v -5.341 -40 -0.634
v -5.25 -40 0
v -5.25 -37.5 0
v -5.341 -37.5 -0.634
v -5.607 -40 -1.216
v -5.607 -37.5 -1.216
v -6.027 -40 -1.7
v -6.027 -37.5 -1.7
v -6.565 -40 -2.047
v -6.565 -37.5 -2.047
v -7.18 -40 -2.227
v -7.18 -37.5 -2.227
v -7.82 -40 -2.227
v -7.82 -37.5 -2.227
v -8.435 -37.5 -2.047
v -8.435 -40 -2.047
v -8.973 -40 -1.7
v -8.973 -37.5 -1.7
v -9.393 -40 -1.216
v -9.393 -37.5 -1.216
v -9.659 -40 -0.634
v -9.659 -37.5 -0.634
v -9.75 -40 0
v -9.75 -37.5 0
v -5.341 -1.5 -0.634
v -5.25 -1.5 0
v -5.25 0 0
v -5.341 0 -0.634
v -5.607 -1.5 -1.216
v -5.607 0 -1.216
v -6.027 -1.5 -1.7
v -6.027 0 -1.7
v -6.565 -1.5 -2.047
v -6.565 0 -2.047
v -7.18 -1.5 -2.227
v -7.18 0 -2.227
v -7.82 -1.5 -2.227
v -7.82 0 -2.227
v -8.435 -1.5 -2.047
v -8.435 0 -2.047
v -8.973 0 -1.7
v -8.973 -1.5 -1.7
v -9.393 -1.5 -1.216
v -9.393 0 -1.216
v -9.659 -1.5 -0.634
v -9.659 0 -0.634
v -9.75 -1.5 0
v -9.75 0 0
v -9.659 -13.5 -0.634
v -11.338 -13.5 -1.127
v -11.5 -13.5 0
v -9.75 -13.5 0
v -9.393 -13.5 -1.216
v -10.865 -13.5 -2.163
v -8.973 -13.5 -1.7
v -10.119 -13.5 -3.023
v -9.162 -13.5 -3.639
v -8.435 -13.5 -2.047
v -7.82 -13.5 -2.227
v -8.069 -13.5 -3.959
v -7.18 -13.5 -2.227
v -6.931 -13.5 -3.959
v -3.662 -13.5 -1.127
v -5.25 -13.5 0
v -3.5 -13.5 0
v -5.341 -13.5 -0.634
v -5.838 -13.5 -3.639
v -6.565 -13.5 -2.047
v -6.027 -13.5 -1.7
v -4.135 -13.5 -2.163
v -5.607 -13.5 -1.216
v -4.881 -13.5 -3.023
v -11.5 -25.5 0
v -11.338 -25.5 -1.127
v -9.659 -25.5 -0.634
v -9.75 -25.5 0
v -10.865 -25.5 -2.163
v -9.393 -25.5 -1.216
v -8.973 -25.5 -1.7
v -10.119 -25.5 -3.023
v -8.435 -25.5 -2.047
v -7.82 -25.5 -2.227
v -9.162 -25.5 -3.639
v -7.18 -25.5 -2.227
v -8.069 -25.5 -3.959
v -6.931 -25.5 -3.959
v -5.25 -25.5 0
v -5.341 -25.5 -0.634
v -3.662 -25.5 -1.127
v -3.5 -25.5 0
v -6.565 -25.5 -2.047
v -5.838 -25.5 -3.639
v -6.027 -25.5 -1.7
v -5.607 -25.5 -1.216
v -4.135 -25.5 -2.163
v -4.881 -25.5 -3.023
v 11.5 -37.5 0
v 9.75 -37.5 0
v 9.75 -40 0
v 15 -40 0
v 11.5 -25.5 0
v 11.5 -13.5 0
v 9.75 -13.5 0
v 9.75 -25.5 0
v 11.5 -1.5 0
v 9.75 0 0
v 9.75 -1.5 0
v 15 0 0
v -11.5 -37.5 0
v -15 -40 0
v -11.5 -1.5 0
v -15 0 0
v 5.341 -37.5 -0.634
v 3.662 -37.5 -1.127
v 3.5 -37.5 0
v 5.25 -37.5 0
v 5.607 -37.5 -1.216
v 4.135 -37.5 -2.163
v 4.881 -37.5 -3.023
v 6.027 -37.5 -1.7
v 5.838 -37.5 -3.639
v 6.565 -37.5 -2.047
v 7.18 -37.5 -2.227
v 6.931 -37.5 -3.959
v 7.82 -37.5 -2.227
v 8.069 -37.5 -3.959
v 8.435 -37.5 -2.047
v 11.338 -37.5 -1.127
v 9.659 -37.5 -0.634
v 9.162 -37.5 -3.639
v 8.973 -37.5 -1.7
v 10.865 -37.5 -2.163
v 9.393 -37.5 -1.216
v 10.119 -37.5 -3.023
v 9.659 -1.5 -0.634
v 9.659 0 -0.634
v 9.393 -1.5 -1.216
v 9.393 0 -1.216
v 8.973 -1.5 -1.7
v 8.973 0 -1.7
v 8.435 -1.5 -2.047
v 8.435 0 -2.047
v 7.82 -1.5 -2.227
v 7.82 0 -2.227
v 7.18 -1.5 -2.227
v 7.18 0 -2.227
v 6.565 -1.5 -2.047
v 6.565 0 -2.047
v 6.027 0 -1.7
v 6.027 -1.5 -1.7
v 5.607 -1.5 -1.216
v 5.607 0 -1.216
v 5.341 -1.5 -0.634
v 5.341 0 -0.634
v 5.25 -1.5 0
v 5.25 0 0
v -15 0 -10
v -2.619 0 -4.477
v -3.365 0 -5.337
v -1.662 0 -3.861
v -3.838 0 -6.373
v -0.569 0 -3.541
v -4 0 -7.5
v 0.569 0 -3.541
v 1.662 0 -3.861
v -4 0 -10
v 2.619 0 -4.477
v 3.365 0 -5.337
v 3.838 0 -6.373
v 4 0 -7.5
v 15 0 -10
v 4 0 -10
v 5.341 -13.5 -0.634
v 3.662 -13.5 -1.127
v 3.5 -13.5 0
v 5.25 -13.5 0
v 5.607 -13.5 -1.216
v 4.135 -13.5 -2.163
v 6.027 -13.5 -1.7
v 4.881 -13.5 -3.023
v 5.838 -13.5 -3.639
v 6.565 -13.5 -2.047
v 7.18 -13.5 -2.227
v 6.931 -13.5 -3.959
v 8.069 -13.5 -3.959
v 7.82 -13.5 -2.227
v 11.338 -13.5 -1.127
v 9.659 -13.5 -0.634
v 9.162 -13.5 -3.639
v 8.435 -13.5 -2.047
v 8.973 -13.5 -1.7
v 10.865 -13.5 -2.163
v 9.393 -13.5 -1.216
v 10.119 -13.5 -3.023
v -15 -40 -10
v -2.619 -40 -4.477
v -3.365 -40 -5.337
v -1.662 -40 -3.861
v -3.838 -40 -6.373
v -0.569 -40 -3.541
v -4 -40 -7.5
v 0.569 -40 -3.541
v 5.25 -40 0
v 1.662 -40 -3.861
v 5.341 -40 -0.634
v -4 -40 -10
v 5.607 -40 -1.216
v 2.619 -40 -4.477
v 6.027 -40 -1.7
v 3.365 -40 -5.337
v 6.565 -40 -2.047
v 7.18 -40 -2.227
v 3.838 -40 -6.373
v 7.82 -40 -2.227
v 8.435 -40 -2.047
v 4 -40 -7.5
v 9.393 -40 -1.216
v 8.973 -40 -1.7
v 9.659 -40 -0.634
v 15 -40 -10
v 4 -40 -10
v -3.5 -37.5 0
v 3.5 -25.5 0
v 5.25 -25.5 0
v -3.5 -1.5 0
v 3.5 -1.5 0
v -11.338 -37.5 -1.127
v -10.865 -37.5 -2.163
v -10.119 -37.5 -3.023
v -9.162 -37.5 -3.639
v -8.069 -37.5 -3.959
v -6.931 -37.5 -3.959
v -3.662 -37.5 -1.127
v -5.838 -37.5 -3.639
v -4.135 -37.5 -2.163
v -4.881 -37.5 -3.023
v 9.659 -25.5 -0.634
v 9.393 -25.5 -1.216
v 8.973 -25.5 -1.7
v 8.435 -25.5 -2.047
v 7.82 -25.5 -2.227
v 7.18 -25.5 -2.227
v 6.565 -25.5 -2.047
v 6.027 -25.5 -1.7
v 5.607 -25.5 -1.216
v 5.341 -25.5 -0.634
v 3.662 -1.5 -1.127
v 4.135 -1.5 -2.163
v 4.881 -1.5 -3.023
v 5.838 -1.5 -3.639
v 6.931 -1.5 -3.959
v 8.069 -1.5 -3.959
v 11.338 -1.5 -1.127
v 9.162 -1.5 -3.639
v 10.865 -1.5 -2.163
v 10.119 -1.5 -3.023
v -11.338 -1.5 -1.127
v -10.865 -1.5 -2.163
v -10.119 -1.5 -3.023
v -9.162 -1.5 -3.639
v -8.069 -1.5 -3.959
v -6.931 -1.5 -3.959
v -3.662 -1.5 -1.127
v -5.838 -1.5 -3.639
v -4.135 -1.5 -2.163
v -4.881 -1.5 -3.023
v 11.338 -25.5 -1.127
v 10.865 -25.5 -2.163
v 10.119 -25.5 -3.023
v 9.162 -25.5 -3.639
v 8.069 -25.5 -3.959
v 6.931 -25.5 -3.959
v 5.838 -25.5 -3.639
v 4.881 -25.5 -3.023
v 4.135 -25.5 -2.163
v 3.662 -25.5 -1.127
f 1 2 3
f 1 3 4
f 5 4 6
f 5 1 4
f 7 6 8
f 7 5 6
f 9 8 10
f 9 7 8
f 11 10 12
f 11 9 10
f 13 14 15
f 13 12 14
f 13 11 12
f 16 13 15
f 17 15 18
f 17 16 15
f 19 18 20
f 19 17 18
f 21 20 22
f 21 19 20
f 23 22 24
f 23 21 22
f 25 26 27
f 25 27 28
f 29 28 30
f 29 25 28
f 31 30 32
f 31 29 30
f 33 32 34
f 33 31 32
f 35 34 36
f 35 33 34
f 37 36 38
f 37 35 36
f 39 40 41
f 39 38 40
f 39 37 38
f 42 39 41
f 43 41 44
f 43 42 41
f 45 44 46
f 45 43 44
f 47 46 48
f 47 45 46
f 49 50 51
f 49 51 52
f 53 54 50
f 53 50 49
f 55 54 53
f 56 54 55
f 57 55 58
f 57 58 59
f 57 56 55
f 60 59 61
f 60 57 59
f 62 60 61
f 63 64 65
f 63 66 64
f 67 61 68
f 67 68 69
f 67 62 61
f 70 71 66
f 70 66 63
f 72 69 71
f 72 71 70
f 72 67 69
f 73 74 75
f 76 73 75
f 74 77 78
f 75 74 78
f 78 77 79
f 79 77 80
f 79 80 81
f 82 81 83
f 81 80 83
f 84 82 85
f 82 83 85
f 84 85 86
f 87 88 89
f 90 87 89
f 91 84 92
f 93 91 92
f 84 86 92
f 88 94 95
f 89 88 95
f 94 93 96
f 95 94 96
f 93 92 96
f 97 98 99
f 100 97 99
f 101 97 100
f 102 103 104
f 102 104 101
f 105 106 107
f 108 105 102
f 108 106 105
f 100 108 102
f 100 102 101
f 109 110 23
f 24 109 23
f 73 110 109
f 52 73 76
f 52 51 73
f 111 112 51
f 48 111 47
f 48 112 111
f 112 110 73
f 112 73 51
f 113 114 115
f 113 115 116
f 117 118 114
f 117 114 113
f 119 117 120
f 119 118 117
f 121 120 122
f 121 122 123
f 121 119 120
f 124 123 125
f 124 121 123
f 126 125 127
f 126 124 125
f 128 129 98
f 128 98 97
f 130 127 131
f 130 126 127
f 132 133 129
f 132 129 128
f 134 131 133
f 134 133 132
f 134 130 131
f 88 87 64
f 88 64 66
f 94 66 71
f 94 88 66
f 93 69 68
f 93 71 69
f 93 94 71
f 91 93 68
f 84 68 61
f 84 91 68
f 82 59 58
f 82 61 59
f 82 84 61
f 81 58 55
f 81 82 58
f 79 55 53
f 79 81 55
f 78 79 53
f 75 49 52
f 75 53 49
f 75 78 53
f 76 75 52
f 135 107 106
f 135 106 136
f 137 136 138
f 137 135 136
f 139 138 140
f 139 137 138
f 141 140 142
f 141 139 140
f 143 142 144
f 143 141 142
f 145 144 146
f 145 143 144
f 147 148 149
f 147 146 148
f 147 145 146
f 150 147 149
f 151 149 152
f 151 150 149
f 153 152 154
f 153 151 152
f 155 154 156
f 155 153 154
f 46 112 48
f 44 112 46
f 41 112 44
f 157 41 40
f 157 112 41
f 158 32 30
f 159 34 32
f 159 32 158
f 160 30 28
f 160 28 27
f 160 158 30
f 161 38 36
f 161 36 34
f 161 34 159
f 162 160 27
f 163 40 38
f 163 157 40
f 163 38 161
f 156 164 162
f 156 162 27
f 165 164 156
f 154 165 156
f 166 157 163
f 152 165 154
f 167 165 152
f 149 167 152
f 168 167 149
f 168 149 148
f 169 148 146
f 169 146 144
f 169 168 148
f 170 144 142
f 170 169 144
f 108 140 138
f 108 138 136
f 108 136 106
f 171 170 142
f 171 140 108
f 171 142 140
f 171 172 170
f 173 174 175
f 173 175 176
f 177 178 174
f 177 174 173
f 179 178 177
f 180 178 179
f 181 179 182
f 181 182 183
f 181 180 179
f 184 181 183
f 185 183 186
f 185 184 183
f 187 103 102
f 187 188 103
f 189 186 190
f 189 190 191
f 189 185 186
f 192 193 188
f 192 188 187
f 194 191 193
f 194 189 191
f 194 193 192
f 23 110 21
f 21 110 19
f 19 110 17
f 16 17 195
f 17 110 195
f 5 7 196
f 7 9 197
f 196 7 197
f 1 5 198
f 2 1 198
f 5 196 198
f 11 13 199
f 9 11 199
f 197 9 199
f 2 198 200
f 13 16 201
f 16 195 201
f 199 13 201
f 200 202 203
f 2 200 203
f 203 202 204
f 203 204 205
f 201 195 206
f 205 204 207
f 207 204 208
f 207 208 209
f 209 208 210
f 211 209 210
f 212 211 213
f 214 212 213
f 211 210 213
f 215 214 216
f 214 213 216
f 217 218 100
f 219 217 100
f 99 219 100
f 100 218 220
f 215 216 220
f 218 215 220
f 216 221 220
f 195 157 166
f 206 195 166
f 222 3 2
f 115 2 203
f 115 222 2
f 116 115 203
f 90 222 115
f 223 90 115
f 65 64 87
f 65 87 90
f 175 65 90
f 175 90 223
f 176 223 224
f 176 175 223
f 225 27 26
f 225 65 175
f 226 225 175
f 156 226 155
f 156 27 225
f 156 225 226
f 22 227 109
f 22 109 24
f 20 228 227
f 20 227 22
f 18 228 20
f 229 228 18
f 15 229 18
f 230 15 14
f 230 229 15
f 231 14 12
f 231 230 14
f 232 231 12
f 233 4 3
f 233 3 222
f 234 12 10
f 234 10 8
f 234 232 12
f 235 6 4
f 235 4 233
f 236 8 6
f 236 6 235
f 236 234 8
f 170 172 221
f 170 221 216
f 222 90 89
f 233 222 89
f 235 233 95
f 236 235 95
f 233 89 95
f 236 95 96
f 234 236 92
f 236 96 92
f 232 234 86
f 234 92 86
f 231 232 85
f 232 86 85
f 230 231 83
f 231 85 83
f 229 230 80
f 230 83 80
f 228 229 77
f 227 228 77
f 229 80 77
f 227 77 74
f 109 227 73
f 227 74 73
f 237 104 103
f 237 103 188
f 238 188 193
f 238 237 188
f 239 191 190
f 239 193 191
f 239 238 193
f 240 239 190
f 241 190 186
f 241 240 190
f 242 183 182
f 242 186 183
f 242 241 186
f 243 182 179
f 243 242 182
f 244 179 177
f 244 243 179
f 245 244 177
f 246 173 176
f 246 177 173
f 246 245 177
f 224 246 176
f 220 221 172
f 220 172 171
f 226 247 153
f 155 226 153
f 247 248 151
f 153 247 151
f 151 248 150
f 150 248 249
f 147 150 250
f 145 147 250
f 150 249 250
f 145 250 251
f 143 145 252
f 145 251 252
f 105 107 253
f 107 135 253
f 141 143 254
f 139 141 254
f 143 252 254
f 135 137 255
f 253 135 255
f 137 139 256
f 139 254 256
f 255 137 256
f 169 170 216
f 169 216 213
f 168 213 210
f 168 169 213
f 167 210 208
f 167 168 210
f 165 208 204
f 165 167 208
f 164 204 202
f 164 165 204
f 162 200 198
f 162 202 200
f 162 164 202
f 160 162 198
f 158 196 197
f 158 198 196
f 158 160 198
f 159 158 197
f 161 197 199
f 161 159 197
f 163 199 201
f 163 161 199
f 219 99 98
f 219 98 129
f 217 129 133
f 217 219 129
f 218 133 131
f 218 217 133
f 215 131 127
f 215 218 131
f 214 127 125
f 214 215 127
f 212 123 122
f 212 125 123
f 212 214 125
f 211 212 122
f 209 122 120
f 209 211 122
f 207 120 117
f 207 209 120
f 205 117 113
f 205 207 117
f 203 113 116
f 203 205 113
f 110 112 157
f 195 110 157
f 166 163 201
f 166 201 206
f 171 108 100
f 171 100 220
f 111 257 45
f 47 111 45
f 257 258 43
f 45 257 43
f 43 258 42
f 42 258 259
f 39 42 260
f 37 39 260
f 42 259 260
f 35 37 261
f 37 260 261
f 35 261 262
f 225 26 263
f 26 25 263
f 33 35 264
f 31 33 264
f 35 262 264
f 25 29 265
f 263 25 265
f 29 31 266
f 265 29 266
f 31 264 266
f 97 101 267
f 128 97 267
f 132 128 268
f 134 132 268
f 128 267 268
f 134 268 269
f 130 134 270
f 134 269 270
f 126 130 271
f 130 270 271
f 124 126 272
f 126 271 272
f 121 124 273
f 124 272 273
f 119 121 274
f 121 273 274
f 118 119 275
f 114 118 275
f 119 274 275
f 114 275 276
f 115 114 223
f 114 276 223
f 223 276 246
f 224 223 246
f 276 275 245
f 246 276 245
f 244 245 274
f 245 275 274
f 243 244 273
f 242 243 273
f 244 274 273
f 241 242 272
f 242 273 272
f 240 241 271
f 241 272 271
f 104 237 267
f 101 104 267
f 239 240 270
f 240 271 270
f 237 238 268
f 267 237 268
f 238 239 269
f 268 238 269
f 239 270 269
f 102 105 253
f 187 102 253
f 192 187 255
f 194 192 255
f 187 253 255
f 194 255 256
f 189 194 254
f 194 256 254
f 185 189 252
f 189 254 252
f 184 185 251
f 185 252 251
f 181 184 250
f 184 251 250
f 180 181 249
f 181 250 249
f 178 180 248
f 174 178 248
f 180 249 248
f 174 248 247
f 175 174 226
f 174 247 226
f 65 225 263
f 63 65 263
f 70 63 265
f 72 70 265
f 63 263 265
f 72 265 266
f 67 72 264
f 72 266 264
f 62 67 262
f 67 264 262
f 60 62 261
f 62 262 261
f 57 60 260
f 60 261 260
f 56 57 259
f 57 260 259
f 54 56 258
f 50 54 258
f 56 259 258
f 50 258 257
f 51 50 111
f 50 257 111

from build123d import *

# Parameters (mm, degrees)
SKETCH_1_W               = 30
SKETCH_1_H               = 10
EXTRUDE_1_DEPTH          = 40
CUT_EXTRUDE_START        = -1.5
SKETCH_2_R               = 4
CUT_EXTRUDE_1_DEPTH      = 12
CUT_EXTRUDE_START_2      = -12
CUT_EXTRUDE_2_DEPTH      = 12
CUT_EXTRUDE_3_DEPTH      = 33.050741021
CUT_EXTRUDE_3_DEPTH_BACK = 33.050741021
SKETCH_4_R               = 2.25
CUT_EXTRUDE_4_DEPTH      = 44.874821937


with BuildPart() as part:
    # 草图1 → 凸台-拉伸1 (new body)
    with BuildSketch(Plane(origin=(0, 0, 0), x_dir=(1, 0, 0), z_dir=(0, 1, 0))):
        with Locations((0, 5)):
            Rectangle(SKETCH_1_W, SKETCH_1_H)
    extrude(amount=-EXTRUDE_1_DEPTH)

    # 草图2 → 切除-拉伸1 (cut)
    with BuildSketch(Plane(origin=(0, 0, 0), x_dir=(1, 0, 0), z_dir=(0, 1, 0)).offset(CUT_EXTRUDE_START)):
        with Locations((-7.5, 0)):
            Circle(SKETCH_2_R)
        with Locations((7.5, 0)):
            Circle(SKETCH_2_R)
    extrude(amount=-CUT_EXTRUDE_1_DEPTH, mode=Mode.SUBTRACT)

    # 草图3 → 切除-拉伸2 (cut)
    with BuildSketch(Plane(origin=(0, -13.5, 0), x_dir=(1, 0, 0), z_dir=(0, 1, 0)).offset(CUT_EXTRUDE_START_2)):
        with BuildLine():
            Line((-11.5, 0), (-3.5, 0))
            ThreePointArc((-3.5, 0), (-7.5, 4), (-11.5, 0))
        make_face()
        with BuildLine():
            Line((3.5, 0), (11.5, 0))
            ThreePointArc((11.5, 0), (7.5, 4), (3.5, 0))
        make_face()
    extrude(amount=-CUT_EXTRUDE_2_DEPTH, mode=Mode.SUBTRACT)

    # 草图4 → 切除-拉伸3 (cut, two sides: drawn at the far end of the back side and taken through both)
    with BuildSketch(Plane(origin=(0, -13.5, 0), x_dir=(1, 0, 0), z_dir=(0, 1, 0)).offset(-CUT_EXTRUDE_3_DEPTH_BACK)):
        with Locations((-7.5, 0)):
            Circle(SKETCH_4_R)
        with Locations((7.5, 0)):
            Circle(SKETCH_4_R)
    extrude(amount=CUT_EXTRUDE_3_DEPTH + CUT_EXTRUDE_3_DEPTH_BACK, mode=Mode.SUBTRACT)

    # 草图5 → 切除-拉伸4 (cut, through all)
    with BuildSketch(Plane(origin=(0, 0, 0), x_dir=(1, 0, 0), z_dir=(0, 1, 0))):
        with BuildLine():
            Line((-4, 7.5), (-4, 10))
            ThreePointArc((-4, 10), (0, 14), (4, 10))
            Line((4, 10), (4, 7.5))
            ThreePointArc((4, 7.5), (0, 3.5), (-4, 7.5))
        make_face()
    extrude(amount=-CUT_EXTRUDE_4_DEPTH, mode=Mode.SUBTRACT)


solid = part.part
